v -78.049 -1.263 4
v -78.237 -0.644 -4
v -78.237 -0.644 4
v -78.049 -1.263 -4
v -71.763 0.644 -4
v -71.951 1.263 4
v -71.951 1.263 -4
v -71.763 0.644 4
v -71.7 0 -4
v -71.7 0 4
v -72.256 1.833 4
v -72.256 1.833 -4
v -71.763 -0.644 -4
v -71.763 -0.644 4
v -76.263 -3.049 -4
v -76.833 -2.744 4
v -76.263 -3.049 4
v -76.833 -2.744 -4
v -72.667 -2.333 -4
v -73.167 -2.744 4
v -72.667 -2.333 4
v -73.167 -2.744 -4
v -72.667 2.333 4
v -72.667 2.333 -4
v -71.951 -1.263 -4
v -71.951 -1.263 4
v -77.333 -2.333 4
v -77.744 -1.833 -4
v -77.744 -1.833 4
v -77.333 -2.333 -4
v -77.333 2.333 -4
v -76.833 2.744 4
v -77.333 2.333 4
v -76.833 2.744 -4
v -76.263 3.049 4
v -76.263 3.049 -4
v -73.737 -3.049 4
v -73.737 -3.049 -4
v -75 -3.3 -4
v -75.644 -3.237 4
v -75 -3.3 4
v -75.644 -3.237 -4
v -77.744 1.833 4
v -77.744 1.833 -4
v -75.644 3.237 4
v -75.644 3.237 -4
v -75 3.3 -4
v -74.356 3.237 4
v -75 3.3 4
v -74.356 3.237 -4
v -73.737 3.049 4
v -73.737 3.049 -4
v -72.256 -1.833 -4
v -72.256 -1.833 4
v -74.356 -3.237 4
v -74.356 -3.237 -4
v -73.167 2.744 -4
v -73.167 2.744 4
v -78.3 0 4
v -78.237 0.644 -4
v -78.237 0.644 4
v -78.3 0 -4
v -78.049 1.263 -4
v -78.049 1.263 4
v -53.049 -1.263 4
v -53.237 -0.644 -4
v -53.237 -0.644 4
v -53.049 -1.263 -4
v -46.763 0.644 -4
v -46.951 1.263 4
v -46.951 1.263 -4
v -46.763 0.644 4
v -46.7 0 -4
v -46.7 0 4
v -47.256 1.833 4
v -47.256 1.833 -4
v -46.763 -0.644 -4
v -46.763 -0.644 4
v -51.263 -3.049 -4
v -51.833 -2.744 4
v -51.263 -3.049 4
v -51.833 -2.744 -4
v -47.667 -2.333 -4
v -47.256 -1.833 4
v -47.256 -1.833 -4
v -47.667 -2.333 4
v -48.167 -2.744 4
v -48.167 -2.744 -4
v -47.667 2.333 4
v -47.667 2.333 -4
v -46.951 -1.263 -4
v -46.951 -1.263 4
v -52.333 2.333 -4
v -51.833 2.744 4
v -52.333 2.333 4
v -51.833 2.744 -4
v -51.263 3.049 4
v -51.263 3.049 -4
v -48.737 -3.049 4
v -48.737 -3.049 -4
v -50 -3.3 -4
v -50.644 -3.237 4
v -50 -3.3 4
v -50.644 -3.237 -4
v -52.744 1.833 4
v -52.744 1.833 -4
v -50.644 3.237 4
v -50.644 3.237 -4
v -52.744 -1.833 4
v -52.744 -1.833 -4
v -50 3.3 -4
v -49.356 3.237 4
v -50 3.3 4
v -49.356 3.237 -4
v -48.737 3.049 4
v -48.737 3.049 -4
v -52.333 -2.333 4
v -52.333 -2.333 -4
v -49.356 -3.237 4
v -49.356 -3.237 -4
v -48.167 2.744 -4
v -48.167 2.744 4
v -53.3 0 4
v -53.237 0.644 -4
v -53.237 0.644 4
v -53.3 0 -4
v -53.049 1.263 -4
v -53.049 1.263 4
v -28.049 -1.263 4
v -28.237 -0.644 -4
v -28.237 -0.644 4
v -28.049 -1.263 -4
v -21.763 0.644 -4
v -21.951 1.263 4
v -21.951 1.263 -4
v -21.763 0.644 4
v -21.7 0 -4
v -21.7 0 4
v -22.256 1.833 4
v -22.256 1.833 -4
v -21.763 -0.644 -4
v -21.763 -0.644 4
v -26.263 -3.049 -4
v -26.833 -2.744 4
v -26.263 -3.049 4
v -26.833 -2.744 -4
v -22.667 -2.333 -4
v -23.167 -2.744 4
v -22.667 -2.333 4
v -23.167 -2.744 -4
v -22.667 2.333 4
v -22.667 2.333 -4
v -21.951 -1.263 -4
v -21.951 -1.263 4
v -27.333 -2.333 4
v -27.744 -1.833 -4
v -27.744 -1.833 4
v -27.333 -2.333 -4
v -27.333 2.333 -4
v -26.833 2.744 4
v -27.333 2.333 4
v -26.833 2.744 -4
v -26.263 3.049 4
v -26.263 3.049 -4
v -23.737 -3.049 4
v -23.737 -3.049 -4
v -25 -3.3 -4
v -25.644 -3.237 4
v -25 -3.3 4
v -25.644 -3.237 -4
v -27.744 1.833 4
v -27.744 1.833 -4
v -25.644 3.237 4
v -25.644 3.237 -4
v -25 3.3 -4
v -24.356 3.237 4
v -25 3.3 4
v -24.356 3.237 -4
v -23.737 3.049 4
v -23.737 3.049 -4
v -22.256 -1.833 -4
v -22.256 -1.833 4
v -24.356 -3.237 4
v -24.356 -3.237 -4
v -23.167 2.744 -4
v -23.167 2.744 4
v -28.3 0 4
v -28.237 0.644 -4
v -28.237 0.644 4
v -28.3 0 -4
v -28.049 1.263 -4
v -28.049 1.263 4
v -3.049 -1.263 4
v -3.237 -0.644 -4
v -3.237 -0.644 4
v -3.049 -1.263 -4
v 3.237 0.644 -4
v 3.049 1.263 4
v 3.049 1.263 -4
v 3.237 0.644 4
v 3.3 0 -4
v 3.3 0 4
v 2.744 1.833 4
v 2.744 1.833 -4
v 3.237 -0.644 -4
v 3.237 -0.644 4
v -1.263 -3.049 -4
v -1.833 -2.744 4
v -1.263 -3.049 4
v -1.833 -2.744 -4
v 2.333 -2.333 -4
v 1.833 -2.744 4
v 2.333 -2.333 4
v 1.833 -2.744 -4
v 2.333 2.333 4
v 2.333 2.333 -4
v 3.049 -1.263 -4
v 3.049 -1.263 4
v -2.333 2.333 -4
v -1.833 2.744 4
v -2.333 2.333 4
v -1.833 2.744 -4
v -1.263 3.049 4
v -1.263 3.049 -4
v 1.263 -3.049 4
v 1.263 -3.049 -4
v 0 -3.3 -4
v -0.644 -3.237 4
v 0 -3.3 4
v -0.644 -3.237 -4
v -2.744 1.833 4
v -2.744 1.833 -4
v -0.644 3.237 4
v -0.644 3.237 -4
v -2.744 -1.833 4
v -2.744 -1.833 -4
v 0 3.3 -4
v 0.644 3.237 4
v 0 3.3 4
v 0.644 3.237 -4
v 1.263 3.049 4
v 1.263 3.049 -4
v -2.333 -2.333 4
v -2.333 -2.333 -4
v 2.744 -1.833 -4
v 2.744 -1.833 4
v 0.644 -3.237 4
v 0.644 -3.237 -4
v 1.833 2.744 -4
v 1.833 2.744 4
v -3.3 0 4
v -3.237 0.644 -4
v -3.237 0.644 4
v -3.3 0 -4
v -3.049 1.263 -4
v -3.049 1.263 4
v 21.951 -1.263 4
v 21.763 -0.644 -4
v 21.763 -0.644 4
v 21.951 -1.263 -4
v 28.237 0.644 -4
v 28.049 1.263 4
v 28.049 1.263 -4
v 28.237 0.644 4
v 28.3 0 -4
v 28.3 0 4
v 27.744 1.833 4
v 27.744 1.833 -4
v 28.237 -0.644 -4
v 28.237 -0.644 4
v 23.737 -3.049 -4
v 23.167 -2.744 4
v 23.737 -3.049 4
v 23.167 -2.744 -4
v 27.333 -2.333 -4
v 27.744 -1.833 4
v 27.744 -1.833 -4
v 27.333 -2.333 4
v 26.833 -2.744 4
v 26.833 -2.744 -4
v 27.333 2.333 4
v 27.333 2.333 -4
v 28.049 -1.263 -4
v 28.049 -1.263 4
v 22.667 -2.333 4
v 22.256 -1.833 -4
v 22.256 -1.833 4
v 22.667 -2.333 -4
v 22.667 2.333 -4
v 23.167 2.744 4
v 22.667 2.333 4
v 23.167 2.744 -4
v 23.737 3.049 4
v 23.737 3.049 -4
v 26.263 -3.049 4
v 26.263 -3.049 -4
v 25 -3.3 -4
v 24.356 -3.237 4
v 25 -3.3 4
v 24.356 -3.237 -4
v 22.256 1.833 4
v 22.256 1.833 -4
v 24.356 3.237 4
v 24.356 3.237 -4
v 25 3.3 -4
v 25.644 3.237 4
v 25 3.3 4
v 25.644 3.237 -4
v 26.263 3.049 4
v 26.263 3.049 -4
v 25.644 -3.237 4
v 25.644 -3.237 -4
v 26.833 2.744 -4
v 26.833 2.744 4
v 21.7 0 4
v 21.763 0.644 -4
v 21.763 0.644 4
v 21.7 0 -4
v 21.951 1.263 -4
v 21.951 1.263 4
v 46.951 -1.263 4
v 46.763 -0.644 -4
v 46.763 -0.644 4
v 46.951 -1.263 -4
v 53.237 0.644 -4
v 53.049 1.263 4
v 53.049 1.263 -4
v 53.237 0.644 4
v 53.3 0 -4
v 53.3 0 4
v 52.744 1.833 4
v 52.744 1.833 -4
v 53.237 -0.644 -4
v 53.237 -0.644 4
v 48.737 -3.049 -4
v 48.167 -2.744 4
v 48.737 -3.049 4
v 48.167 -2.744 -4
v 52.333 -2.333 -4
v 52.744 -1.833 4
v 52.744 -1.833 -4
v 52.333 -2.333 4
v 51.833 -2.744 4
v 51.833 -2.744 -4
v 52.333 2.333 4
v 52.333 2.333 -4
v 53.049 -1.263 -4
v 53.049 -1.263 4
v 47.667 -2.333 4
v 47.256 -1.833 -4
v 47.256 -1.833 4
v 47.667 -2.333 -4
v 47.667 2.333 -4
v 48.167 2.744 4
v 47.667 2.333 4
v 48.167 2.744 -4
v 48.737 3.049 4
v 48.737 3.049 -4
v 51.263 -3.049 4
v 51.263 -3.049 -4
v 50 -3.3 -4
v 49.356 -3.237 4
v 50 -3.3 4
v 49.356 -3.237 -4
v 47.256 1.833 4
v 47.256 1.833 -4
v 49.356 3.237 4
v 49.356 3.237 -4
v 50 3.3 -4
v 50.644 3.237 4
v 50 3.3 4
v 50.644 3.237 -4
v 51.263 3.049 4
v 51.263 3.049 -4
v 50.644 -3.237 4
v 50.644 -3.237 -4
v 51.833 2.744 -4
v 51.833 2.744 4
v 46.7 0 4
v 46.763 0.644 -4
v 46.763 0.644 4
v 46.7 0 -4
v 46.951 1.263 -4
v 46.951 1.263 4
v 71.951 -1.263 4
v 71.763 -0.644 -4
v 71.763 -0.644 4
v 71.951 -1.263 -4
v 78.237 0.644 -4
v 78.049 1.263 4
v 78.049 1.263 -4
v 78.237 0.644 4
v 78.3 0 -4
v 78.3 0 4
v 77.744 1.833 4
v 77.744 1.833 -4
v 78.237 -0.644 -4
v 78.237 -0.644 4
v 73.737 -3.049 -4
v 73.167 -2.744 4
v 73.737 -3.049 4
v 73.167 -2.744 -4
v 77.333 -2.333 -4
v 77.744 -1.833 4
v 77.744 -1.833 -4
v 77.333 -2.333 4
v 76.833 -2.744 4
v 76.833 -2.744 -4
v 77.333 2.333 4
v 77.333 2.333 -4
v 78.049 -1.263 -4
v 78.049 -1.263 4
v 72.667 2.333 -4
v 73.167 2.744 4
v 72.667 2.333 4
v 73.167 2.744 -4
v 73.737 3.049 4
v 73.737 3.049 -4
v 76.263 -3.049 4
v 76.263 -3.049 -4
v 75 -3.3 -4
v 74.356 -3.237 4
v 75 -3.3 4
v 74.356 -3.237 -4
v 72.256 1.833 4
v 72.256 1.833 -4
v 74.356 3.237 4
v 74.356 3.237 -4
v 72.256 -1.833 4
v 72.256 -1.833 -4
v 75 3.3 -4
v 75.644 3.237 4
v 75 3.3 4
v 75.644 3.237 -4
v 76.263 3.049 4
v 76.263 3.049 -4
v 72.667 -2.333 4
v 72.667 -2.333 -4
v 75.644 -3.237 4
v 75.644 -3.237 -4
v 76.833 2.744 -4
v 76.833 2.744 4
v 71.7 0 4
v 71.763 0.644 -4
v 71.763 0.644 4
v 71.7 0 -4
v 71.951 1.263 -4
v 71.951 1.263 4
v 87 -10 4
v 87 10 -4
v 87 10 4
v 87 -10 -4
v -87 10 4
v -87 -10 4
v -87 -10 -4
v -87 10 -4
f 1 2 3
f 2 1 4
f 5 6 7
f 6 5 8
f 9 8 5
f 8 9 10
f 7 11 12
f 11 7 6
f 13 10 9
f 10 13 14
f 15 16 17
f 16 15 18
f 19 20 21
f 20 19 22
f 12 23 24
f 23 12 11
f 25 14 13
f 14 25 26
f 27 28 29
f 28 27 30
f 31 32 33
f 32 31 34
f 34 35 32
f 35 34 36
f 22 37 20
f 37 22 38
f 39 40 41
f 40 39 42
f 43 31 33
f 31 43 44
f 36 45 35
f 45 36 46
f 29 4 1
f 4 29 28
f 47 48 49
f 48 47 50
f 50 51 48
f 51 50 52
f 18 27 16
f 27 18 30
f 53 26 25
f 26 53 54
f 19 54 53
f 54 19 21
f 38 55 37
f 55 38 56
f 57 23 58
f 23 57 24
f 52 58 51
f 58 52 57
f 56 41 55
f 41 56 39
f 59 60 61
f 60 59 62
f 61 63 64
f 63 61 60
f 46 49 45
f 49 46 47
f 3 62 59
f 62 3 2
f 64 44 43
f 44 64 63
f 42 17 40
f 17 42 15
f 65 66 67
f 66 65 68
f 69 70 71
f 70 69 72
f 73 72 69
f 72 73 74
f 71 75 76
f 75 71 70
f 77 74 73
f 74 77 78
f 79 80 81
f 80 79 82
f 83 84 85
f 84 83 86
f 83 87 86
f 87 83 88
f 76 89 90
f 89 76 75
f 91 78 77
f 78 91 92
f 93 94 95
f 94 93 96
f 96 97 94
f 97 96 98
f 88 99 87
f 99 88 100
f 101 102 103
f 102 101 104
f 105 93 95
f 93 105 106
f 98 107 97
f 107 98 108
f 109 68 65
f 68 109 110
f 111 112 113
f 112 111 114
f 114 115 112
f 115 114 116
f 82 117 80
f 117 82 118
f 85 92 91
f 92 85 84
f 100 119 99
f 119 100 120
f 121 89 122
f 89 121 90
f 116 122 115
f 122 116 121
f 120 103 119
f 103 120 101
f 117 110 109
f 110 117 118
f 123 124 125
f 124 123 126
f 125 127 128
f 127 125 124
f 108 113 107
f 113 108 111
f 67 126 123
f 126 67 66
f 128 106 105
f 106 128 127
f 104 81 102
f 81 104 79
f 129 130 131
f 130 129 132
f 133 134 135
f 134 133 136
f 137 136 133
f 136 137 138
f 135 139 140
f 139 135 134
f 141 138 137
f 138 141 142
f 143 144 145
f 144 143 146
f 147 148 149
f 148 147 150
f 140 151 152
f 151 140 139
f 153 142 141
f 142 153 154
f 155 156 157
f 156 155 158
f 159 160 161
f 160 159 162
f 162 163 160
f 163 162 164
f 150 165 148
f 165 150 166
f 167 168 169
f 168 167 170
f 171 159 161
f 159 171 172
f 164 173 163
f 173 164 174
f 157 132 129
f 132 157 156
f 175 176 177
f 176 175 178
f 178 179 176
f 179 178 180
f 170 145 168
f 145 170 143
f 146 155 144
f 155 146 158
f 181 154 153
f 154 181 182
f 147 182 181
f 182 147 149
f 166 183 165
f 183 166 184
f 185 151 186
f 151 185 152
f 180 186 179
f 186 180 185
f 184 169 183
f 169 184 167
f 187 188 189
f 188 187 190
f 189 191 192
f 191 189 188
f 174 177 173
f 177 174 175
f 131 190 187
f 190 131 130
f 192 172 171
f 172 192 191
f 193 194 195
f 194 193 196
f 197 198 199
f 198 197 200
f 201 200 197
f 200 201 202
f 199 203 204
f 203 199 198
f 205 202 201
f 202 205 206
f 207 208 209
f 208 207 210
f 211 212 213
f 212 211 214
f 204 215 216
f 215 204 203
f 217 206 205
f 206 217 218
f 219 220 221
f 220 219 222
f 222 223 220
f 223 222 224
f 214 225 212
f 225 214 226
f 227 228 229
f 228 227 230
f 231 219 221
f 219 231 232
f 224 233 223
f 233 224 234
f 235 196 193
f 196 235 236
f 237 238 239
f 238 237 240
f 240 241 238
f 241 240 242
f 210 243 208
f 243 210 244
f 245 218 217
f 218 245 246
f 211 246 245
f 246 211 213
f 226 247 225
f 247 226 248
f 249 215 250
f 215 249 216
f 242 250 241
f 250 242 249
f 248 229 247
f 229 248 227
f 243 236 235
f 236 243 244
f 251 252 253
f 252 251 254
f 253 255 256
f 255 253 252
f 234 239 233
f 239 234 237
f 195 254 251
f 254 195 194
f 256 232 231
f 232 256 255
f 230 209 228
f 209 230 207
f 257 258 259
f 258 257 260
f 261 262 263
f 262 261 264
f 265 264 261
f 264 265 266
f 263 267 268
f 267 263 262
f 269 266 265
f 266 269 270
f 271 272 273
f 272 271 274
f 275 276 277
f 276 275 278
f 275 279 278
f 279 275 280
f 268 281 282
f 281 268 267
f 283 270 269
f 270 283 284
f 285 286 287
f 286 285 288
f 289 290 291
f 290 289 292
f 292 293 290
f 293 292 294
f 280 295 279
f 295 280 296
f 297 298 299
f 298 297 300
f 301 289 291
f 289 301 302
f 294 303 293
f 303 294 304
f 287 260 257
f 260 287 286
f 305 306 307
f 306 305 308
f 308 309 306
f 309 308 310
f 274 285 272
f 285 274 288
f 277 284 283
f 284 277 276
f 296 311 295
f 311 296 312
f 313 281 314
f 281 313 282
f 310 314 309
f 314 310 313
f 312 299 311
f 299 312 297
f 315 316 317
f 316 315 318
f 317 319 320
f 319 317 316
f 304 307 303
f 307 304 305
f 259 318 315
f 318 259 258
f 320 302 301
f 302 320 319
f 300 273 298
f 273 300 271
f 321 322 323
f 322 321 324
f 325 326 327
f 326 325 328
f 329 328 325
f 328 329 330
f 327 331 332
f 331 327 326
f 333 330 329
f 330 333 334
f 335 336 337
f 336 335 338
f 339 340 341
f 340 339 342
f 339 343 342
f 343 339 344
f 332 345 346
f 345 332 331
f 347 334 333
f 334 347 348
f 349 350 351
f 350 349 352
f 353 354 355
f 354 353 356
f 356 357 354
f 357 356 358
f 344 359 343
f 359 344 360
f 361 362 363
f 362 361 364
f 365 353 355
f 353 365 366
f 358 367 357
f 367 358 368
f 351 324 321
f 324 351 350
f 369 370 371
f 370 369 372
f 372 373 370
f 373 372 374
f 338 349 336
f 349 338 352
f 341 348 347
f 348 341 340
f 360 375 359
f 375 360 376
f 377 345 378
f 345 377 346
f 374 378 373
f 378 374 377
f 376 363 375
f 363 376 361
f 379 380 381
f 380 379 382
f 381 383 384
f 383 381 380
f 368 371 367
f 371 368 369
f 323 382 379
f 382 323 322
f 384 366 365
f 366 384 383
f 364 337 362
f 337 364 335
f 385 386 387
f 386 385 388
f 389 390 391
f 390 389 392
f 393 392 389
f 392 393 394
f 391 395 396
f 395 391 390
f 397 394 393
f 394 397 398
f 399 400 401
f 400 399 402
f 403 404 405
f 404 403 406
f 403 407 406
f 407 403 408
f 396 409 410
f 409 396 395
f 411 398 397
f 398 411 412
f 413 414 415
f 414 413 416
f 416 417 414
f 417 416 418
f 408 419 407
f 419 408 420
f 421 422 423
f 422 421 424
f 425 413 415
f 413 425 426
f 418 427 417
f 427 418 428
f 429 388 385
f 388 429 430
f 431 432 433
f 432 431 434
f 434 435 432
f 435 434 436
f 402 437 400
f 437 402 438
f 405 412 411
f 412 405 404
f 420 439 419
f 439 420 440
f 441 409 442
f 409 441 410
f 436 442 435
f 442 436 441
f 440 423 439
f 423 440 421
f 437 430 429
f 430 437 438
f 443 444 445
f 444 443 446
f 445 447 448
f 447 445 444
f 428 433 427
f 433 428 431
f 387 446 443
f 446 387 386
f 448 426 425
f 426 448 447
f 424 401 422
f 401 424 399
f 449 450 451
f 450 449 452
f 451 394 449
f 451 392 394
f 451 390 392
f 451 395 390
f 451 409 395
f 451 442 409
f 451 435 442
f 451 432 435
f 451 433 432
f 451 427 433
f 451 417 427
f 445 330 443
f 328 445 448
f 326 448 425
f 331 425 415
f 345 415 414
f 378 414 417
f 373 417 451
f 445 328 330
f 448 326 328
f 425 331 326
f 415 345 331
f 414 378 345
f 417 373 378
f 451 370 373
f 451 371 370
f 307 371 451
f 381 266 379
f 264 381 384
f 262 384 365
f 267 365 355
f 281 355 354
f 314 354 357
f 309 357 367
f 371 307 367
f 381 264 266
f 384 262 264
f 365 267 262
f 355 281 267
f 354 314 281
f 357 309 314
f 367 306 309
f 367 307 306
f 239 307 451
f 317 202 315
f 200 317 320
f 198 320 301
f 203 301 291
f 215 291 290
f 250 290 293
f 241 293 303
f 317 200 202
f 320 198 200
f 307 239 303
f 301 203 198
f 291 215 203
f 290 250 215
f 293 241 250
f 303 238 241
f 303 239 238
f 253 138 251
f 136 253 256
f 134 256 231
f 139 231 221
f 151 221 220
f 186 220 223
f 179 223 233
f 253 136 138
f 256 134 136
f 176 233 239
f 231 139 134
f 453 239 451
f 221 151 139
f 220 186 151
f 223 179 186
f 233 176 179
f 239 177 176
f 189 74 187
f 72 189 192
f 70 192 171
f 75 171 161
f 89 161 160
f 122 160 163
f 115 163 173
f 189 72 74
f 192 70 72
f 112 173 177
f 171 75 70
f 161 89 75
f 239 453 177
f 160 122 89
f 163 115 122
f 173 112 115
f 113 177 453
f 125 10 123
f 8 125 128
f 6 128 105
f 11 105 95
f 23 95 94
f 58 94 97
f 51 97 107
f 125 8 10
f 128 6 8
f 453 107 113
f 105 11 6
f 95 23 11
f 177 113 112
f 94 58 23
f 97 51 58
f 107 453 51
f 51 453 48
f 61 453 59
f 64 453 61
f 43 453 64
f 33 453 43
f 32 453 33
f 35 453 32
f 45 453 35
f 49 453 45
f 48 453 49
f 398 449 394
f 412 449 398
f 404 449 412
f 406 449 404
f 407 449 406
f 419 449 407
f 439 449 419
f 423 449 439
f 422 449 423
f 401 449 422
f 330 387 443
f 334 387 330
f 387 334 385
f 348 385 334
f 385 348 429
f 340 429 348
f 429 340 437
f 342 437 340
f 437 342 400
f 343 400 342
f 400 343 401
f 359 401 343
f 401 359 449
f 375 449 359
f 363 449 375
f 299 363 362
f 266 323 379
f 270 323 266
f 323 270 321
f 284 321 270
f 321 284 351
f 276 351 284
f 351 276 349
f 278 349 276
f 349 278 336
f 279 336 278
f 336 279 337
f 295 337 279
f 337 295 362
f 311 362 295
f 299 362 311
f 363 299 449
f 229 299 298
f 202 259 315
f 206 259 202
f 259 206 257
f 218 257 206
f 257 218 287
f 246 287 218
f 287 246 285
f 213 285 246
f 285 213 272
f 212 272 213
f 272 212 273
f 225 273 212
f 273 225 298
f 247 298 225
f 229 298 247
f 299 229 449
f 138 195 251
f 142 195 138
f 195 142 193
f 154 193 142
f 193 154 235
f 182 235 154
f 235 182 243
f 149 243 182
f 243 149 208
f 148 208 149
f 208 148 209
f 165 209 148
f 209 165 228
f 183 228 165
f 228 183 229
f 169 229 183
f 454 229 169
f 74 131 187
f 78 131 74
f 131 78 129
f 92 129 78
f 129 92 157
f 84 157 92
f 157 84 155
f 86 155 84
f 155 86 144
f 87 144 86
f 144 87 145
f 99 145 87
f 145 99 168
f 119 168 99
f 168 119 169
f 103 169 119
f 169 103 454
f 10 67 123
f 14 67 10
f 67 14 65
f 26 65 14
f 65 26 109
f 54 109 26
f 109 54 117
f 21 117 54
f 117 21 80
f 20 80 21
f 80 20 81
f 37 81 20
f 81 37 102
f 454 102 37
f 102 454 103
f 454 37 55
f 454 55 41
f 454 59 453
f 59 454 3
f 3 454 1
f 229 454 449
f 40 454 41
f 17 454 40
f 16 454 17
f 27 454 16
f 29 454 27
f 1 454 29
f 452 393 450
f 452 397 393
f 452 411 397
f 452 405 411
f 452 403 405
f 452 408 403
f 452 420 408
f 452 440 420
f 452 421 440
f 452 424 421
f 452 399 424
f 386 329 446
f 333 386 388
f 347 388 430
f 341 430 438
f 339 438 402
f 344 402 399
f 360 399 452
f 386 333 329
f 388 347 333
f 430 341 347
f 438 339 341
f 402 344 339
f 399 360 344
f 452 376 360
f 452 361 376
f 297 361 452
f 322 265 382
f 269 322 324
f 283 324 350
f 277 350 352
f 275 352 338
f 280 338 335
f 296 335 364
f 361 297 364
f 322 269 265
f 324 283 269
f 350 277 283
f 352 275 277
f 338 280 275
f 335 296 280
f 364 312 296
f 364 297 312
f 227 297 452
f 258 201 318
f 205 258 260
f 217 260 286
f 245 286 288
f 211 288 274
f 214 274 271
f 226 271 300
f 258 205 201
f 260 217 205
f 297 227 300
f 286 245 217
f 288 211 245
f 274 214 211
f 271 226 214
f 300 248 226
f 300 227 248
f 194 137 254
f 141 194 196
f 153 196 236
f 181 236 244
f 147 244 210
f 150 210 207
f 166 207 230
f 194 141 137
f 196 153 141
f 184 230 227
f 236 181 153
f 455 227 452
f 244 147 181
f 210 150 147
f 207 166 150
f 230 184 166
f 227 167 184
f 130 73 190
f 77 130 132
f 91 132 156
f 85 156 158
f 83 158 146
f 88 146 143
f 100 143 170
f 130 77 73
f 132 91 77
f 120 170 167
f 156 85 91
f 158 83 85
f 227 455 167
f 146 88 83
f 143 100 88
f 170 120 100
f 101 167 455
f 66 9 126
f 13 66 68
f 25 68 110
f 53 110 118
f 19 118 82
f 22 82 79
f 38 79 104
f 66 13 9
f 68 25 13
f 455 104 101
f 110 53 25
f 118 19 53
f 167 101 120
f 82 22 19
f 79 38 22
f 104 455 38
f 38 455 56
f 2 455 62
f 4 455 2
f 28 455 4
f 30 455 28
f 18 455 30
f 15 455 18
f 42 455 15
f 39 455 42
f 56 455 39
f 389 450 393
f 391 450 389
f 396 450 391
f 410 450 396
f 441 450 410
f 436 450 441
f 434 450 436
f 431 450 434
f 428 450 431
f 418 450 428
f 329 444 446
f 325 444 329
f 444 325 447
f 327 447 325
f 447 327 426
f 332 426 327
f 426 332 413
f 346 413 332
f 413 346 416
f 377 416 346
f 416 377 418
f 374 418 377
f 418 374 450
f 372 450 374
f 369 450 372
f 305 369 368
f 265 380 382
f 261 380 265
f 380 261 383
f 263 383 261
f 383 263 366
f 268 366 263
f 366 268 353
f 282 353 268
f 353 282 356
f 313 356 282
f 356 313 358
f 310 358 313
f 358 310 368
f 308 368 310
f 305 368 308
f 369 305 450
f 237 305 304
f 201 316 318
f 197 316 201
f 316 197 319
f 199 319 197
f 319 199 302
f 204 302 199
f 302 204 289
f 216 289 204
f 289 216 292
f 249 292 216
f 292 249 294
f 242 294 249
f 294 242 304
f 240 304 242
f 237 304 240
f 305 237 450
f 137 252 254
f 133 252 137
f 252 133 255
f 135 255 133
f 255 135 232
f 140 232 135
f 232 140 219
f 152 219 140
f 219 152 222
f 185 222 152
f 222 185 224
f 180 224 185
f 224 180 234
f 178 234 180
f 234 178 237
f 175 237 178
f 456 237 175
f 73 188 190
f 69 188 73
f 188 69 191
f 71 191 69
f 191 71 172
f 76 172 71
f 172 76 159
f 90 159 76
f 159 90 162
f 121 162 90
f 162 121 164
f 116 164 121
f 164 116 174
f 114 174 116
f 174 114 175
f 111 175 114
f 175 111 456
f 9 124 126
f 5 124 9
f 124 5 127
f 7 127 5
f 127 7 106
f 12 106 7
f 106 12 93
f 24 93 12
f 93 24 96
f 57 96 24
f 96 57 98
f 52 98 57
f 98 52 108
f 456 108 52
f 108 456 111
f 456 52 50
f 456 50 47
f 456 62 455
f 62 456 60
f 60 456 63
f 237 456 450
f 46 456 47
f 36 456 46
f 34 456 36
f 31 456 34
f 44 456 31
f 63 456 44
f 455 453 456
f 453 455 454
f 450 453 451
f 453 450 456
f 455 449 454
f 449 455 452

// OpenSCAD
$fn = 32;

// ----------------------------------------------------------------------
// Hole bar, 7 x Ø6.6
// skip layout, 12 mm edge offset
// ----------------------------------------------------------------------

// --- parameters (mm) ---
bar_w = 20;         // bar width (Y)
bar_t = 8;          // bar thickness (Z)
holes = 7;          // holes per row
hole_d = 6.6;       // hole diameter
edge = 12;          // offset from the bar end to the first hole
grid_pitch = 12.5;  // grid the bar was laid out on

// --- derived feature positions (mm) ---
pitch = grid_pitch * 2;       // = 25   holes sit every other grid slot
span = (holes - 1) * pitch;   // = 150   distance between the end holes
bar_l = span + 2 * edge;      // = 174   overall bar length
start_x = -bar_l / 2 + edge;  // = -75   X of the first hole
feature_centers = [
  [start_x + 0 * pitch, 0],
  [start_x + 1 * pitch, 0],
  [start_x + 2 * pitch, 0],
  [start_x + 3 * pitch, 0],
  [start_x + 4 * pitch, 0],
  [start_x + 5 * pitch, 0],
  [start_x + 6 * pitch, 0]
];   // hole centres of the first row

// bar with one row of holes, drilled from feature_centers
difference() {
  translate([-bar_l / 2, -bar_w / 2, -bar_t / 2]) cube([bar_l, bar_w, bar_t]);
  for (centre = feature_centers)
    translate([centre[0], centre[1], 0])
      cylinder(d = hole_d, h = bar_t + 2, center = true);
}
